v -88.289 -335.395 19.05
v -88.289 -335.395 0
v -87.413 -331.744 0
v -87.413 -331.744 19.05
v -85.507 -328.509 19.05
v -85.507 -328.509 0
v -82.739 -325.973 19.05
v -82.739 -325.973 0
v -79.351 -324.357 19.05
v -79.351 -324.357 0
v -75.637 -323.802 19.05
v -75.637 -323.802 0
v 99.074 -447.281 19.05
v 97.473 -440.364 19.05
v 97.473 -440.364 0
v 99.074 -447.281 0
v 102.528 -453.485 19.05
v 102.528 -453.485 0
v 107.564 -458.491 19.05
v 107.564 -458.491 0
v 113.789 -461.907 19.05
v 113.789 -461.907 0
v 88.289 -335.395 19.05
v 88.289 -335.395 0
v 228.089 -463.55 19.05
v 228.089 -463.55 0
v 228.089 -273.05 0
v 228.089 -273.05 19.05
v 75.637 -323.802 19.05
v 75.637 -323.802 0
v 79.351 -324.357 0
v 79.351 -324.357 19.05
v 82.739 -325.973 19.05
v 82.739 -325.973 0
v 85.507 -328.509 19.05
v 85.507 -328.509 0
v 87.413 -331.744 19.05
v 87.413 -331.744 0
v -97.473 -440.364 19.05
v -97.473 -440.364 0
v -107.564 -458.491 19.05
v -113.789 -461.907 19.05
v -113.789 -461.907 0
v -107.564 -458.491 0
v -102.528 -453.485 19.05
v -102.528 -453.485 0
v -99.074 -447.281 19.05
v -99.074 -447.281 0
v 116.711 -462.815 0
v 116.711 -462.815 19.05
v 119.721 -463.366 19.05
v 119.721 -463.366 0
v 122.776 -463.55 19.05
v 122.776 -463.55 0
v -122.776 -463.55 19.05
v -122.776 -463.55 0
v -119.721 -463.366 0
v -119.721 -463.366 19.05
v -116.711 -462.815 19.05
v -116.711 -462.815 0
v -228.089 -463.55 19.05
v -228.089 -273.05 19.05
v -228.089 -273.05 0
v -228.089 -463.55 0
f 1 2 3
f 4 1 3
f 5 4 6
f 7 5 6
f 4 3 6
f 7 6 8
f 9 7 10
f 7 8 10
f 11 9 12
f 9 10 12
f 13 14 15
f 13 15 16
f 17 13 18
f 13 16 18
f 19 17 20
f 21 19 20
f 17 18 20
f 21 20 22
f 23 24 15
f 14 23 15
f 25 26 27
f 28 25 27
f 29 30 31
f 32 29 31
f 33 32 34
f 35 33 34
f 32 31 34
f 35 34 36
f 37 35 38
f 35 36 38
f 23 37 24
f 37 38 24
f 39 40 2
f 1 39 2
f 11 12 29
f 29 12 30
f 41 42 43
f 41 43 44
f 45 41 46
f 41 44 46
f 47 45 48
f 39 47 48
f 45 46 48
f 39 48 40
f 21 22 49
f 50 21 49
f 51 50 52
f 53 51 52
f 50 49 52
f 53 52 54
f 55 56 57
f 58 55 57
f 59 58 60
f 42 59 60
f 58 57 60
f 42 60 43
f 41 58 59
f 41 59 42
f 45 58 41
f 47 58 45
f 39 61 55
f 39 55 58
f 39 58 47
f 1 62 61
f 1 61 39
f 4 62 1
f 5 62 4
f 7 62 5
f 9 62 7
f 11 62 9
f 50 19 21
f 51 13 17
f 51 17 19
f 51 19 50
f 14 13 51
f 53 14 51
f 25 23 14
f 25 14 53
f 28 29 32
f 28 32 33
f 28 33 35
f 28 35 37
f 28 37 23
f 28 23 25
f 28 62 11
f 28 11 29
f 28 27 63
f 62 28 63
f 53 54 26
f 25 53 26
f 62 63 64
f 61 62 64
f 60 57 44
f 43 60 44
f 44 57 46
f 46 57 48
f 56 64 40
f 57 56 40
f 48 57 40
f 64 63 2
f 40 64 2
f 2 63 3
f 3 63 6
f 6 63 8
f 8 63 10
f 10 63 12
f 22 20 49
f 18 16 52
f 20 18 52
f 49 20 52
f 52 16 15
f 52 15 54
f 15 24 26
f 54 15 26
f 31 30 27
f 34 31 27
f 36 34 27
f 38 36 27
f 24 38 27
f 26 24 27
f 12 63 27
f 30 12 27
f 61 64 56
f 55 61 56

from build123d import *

# Parameters (mm, degrees)
BOSS_EXTRUDE1_DEPTH = 19.05


with BuildPart() as part:
    # Sketch1 → Boss-Extrude1 (new body)
    with BuildSketch(Plane.XY):
        with BuildLine():
            Line((-228.088766336, -463.55), (-126.488766336, -463.55))
            Line((-126.488766336, -463.55), (-122.776078156, -463.55))
            ThreePointArc((-122.776078156, -463.55), (-118.207935902, -463.135837515), (-113.788766336, -461.906856405))
            ThreePointArc((-113.788766336, -461.906856405), (-102.527903247, -453.485299567), (-97.472732825, -440.363755866))
            Line((-97.472732825, -440.363755866), (-88.289138704, -335.394794733))
            ThreePointArc((-88.289138704, -335.394794733), (-84.217461675, -327.138250488), (-75.637466038, -323.801672666))
            Line((-75.637466038, -323.801672666), (-61.874871948, -323.801672666))
            Line((-61.874871948, -323.801672666), (61.874871948, -323.801672666))
            Line((61.874871948, -323.801672666), (75.637466038, -323.801672666))
            ThreePointArc((75.637466038, -323.801672666), (84.217461675, -327.138250488), (88.289138704, -335.394794733))
            Line((88.289138704, -335.394794733), (97.472732825, -440.363755866))
            ThreePointArc((97.472732825, -440.363755866), (102.527903247, -453.485299567), (113.788766336, -461.906856405))
            ThreePointArc((113.788766336, -461.906856405), (118.207935902, -463.135837515), (122.776078156, -463.55))
            Line((122.776078156, -463.55), (126.488766336, -463.55))
            Line((126.488766336, -463.55), (228.088766336, -463.55))
            Line((228.088766336, -463.55), (228.088766336, -273.05))
            Line((228.088766336, -273.05), (-228.088766336, -273.05))
            Line((-228.088766336, -273.05), (-228.088766336, -463.55))
        make_face()
    extrude(amount=BOSS_EXTRUDE1_DEPTH)


solid = part.part
